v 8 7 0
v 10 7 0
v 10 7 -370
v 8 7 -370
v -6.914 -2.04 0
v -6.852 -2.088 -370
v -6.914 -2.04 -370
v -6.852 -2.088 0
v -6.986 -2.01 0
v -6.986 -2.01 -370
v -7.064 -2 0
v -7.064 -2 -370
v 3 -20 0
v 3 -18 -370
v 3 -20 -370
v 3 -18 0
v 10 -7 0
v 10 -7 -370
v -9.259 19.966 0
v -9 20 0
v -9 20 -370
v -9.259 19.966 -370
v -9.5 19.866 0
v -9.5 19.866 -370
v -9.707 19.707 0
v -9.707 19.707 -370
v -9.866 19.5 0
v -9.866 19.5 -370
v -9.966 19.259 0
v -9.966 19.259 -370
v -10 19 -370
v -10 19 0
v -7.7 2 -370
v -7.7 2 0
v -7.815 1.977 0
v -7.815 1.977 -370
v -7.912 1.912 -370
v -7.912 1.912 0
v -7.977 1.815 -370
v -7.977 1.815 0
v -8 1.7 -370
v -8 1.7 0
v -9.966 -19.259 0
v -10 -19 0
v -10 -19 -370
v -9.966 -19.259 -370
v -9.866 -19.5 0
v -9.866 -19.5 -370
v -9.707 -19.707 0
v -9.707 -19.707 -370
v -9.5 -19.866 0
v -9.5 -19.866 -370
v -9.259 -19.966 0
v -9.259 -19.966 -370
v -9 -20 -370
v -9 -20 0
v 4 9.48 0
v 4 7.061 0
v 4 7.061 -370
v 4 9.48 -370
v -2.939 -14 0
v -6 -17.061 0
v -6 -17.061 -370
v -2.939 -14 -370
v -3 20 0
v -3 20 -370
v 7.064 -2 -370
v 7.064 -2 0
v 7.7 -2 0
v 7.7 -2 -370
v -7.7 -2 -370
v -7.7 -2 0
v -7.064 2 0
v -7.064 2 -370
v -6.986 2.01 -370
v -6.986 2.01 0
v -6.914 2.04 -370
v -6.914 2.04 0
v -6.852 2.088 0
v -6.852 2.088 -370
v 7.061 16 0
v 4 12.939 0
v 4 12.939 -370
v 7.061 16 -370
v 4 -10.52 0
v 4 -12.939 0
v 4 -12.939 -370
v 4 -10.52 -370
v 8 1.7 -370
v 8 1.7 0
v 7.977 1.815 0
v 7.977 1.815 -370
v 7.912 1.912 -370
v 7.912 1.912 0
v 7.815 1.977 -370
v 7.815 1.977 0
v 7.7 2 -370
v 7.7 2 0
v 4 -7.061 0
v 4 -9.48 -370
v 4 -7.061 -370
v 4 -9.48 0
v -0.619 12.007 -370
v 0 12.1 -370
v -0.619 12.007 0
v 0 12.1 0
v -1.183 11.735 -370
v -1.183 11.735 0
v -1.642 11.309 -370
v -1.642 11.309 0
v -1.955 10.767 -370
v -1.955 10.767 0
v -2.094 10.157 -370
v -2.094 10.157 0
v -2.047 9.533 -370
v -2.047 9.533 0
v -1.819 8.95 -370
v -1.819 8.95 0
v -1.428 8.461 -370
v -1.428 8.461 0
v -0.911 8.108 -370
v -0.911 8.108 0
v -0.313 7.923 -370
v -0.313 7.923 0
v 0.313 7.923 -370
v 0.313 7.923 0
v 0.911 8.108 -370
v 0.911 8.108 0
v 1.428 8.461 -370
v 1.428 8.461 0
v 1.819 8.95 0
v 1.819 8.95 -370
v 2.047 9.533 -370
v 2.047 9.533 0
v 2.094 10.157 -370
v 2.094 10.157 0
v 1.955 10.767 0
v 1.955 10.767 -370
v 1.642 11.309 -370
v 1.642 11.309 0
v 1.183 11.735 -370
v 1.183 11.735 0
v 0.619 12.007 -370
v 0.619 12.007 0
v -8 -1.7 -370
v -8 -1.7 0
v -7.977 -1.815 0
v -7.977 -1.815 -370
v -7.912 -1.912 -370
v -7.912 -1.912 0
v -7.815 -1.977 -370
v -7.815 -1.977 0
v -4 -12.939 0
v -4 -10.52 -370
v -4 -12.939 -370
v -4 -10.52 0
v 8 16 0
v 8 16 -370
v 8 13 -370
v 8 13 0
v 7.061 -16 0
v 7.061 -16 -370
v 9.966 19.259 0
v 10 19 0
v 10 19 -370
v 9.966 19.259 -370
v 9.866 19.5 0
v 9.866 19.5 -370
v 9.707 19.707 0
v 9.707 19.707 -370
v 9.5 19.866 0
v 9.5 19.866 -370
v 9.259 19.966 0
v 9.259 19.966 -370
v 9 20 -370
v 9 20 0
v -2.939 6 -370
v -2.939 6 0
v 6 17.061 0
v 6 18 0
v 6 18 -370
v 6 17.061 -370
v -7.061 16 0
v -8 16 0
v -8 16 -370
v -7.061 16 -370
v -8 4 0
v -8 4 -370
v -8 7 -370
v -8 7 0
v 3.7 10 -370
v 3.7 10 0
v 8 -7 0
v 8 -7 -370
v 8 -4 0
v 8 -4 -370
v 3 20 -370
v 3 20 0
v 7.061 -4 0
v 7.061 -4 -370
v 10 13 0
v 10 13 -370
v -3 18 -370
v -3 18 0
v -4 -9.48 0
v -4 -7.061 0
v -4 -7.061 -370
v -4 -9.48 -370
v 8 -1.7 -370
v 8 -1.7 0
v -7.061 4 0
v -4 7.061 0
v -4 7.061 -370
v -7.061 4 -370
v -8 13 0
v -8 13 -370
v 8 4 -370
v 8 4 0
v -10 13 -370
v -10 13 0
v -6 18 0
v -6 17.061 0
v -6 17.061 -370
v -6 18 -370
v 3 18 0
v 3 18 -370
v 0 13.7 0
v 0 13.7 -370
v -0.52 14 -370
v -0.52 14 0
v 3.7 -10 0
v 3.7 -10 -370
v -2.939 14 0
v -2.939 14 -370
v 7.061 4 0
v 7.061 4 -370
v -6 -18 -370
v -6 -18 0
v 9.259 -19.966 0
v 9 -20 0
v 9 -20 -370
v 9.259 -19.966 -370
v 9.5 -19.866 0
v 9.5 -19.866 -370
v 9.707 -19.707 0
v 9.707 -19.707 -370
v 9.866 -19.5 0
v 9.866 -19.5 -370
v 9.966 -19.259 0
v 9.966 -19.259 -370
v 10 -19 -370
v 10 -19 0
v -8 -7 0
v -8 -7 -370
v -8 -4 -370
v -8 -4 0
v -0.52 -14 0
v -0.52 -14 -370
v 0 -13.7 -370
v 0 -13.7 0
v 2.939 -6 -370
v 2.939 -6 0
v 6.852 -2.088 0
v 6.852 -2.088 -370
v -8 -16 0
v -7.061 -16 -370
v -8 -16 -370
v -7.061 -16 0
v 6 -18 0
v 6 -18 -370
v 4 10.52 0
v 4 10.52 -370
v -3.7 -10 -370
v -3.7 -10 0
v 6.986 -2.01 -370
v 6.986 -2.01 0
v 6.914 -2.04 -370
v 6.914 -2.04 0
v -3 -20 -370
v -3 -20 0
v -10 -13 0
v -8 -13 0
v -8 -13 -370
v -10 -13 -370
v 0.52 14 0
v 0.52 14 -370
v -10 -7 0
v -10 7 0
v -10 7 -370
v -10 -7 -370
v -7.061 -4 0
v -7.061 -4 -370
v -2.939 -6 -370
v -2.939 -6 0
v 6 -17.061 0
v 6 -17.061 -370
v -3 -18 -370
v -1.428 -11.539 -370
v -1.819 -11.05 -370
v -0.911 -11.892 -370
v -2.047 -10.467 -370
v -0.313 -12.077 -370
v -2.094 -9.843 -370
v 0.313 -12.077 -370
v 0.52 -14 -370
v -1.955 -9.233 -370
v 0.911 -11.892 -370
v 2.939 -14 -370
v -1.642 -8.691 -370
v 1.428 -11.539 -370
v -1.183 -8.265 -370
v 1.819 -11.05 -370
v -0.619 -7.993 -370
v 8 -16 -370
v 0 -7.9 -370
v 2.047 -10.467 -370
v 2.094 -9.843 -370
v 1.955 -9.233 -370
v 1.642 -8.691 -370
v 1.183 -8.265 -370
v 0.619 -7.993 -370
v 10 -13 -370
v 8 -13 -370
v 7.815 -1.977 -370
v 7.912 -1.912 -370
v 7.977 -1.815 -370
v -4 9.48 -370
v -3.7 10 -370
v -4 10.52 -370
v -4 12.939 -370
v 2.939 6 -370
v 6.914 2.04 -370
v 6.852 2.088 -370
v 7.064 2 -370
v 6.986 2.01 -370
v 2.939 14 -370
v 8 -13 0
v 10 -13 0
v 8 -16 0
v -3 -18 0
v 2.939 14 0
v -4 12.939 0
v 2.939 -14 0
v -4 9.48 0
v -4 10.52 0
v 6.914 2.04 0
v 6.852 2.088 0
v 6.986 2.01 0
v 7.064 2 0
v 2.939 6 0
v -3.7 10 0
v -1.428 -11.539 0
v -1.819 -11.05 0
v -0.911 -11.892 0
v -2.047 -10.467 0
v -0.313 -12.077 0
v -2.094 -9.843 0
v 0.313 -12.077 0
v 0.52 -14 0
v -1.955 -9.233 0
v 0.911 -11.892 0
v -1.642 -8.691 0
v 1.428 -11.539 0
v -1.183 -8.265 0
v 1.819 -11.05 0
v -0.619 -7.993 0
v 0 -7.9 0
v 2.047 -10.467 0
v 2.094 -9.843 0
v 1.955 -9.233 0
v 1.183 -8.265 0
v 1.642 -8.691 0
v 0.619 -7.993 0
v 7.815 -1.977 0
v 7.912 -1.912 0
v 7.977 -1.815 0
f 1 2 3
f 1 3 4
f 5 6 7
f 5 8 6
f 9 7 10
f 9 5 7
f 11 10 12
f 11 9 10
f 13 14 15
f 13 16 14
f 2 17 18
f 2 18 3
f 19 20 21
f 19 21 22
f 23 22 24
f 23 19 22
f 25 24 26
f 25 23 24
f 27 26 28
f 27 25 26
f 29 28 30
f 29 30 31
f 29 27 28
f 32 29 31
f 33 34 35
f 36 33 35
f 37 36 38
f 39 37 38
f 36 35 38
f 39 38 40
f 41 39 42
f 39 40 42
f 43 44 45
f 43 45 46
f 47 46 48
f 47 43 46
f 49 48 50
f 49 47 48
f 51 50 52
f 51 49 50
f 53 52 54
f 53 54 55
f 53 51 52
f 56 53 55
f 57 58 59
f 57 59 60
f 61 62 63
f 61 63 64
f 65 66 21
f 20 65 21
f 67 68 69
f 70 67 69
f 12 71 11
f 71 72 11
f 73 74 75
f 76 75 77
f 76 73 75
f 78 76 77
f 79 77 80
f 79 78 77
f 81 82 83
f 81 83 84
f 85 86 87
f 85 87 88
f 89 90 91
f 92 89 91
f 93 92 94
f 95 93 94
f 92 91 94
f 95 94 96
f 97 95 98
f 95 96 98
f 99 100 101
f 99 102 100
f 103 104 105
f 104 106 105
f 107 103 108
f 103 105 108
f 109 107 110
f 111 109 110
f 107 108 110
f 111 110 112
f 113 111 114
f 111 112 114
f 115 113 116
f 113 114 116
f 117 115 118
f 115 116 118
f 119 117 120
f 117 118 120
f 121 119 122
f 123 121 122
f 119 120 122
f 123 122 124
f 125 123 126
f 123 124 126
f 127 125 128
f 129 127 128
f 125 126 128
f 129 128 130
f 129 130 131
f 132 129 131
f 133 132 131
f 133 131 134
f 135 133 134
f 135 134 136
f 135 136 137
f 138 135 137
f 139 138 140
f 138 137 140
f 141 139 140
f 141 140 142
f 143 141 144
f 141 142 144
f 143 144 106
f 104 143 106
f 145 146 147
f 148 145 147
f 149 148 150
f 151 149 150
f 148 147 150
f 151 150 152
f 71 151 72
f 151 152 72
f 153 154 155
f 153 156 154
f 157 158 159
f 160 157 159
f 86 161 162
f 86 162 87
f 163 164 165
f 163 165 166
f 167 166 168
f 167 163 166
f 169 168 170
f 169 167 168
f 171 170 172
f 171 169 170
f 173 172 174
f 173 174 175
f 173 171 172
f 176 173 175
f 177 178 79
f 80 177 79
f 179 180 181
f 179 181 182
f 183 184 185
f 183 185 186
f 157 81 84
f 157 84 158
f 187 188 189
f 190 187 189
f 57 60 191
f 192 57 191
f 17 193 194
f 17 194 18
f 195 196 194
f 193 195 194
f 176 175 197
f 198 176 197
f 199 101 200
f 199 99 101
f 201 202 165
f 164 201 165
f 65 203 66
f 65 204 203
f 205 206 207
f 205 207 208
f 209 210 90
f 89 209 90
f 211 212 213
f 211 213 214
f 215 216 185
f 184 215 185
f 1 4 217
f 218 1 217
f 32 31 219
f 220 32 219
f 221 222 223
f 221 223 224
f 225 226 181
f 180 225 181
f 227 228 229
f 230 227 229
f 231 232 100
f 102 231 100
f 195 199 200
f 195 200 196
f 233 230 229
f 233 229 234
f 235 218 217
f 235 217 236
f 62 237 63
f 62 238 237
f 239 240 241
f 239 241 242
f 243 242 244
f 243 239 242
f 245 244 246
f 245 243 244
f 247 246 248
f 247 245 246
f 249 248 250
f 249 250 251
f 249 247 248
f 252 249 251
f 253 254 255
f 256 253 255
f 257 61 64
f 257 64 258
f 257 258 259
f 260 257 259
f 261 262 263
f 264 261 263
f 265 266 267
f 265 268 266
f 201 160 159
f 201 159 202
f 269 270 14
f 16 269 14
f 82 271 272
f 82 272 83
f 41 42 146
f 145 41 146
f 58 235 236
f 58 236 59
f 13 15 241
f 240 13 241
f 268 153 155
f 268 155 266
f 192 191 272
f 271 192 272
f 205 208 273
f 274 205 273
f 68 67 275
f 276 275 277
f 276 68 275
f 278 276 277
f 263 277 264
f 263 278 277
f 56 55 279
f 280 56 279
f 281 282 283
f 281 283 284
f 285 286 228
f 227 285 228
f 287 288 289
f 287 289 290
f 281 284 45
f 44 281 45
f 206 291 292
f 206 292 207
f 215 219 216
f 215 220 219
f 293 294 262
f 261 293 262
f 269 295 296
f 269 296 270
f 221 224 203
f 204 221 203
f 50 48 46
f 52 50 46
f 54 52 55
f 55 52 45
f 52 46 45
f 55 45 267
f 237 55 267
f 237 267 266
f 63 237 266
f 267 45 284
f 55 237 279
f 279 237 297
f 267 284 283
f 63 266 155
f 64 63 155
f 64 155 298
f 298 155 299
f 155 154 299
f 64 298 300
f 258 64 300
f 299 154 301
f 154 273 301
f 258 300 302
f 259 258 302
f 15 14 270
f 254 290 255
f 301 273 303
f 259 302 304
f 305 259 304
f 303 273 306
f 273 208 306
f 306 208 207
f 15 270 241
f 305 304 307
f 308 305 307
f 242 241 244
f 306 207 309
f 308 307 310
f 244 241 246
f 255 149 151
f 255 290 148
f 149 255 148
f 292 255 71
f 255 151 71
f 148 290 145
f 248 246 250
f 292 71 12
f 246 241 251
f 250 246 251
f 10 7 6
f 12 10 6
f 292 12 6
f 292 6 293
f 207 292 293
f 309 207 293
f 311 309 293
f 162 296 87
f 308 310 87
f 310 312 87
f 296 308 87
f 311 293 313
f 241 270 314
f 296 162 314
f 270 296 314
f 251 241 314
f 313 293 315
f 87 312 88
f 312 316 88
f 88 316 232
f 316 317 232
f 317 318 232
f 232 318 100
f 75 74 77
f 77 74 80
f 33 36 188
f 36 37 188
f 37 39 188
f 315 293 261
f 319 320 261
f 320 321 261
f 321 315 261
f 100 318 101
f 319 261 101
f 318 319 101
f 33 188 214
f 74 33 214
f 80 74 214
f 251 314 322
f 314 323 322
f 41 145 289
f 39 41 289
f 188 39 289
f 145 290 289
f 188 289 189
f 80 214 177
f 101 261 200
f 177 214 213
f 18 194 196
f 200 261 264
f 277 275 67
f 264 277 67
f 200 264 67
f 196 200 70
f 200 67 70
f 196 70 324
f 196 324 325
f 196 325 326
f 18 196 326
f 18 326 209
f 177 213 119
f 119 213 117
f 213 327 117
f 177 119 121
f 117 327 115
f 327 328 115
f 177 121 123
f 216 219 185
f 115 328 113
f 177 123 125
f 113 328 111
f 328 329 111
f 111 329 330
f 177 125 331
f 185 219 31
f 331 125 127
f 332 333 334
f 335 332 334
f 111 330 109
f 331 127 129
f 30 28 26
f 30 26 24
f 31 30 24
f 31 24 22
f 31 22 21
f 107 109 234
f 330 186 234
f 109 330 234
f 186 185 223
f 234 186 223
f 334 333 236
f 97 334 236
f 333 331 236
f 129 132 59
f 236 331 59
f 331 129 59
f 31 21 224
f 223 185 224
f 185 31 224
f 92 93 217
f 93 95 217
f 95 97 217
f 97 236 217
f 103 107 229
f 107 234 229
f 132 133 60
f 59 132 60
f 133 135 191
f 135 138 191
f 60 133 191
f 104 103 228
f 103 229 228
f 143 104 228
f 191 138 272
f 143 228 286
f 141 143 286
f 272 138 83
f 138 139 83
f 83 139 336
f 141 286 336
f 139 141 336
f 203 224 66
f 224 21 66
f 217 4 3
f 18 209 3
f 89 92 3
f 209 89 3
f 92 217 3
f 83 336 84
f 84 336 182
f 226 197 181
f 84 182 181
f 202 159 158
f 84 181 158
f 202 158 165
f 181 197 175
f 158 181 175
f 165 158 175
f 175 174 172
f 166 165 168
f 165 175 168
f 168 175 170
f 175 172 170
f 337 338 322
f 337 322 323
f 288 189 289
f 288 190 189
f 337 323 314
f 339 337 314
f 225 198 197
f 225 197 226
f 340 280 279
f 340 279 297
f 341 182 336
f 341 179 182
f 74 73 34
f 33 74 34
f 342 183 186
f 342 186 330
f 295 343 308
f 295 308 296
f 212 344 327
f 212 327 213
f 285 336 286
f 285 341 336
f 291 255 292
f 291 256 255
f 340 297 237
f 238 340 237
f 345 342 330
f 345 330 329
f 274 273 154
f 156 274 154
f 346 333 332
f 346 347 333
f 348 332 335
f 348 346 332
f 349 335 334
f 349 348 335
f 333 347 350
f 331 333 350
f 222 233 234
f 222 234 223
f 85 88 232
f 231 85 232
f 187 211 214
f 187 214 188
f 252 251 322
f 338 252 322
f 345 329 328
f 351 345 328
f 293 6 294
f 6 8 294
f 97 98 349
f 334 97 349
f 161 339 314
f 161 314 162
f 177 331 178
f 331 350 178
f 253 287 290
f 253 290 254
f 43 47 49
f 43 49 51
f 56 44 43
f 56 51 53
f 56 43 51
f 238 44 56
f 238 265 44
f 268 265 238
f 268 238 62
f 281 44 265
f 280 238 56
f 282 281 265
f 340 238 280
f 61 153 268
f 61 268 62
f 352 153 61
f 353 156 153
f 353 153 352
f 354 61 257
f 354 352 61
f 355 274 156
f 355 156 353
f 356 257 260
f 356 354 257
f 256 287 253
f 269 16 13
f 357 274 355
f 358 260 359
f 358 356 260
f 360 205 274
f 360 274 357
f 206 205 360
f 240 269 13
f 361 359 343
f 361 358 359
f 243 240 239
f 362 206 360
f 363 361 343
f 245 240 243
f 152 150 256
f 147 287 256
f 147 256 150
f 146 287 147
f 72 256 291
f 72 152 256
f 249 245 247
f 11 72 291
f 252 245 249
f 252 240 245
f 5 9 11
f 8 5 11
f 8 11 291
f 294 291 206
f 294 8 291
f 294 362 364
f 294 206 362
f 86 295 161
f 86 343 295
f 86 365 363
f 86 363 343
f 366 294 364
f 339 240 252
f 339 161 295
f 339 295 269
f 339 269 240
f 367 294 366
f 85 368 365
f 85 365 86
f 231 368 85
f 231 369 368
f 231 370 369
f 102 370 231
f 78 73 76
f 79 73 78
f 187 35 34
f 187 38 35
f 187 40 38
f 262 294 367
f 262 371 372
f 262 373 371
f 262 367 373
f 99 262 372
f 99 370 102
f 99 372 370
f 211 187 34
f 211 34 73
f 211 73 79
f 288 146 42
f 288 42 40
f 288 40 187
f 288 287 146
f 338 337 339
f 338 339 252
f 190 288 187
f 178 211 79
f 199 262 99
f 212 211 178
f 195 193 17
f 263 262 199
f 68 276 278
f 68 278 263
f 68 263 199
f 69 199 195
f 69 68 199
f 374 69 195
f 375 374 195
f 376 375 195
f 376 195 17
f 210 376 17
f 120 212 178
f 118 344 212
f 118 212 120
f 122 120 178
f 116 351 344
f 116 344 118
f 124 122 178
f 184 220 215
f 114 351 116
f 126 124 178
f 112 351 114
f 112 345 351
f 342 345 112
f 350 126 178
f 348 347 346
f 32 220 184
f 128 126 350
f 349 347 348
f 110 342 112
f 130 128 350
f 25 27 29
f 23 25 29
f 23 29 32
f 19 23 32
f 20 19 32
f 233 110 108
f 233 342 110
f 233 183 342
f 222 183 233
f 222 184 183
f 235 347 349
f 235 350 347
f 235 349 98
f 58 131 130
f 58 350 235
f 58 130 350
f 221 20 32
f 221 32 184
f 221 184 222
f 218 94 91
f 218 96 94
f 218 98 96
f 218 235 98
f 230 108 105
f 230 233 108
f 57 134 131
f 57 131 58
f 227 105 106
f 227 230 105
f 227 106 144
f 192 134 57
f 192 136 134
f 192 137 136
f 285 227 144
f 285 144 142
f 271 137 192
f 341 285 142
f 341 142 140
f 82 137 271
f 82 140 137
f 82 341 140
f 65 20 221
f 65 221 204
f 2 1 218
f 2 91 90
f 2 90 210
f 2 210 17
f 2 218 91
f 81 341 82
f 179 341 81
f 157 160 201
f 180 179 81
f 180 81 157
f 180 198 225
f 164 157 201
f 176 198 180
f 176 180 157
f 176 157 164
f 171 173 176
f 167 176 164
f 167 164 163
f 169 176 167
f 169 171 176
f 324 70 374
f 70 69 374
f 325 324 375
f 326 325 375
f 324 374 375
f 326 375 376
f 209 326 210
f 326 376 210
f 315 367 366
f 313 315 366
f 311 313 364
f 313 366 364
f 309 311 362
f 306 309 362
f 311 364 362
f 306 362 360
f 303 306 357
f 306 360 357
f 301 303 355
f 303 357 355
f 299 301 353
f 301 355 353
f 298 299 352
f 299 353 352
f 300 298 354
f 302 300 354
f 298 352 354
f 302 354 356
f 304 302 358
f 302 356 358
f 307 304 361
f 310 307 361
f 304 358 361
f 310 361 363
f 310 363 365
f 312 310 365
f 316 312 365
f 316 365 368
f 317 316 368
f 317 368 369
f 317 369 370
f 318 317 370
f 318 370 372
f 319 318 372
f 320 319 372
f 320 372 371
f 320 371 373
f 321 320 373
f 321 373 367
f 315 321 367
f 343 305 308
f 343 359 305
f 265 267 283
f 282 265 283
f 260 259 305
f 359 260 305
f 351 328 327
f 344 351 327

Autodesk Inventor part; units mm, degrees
sketch "Sketch_1" plane through (0, 0, 0) normal (0, 0, 1) x (1, 0, 0)
  line L0 (-10, -7) -> (-8, -7)
  line L1 (-8, -7) -> (-8, -4)
  line L2 (-8, -4) -> (-7.0607, -4)
  line L3 (-7.0607, -4) -> (-4, -7.0607)
  line L4 (-4, -7.0607) -> (-4, -9.4804)
  line L5 (-4, -9.4804) -> (-3.7, -10)
  line L6 (-3.7, -10) -> (-4, -10.5196)
  line L7 (-4, -10.5196) -> (-4, -12.9393)
  line L8 (-4, -12.9393) -> (-7.0607, -16)
  line L9 (-7.0607, -16) -> (-8, -16)
  line L10 (-8, -16) -> (-8, -13)
  line L11 (-8, -13) -> (-10, -13)
  line L12 (-10, -13) -> (-10, -19)
  arc A0 (-10, -19) -> (-9, -20) centre (-9, -19) ccw
  line L13 (-9, -20) -> (-3, -20)
  line L14 (-3, -20) -> (-3, -18)
  line L15 (-3, -18) -> (-6, -18)
  line L16 (-6, -18) -> (-6, -17.0607)
  line L17 (-6, -17.0607) -> (-2.9393, -14)
  line L18 (-2.9393, -14) -> (-0.5196, -14)
  line L19 (-0.5196, -14) -> (0, -13.7)
  line L20 (0, -13.7) -> (0.5196, -14)
  line L21 (0.5196, -14) -> (2.9393, -14)
  line L22 (2.9393, -14) -> (6, -17.0607)
  line L23 (6, -17.0607) -> (6, -18)
  line L24 (6, -18) -> (3, -18)
  line L25 (3, -18) -> (3, -20)
  line L26 (3, -20) -> (9, -20)
  arc A1 (9, -20) -> (10, -19) centre (9, -19) ccw
  line L27 (10, -19) -> (10, -13)
  line L28 (10, -13) -> (8, -13)
  line L29 (8, -13) -> (8, -16)
  line L30 (8, -16) -> (7.0607, -16)
  line L31 (7.0607, -16) -> (4, -12.9393)
  line L32 (4, -12.9393) -> (4, -10.5196)
  line L33 (4, -10.5196) -> (3.7, -10)
  line L34 (3.7, -10) -> (4, -9.4804)
  line L35 (4, -9.4804) -> (4, -7.0607)
  line L36 (4, -7.0607) -> (7.0607, -4)
  line L37 (7.0607, -4) -> (8, -4)
  line L38 (8, -4) -> (8, -7)
  line L39 (8, -7) -> (10, -7)
  line L40 (10, -7) -> (10, 7)
  line L41 (10, 7) -> (8, 7)
  line L42 (8, 7) -> (8, 4)
  line L43 (8, 4) -> (7.0607, 4)
  line L44 (7.0607, 4) -> (4, 7.0607)
  line L45 (4, 7.0607) -> (4, 9.4804)
  line L46 (4, 9.4804) -> (3.7, 10)
  line L47 (3.7, 10) -> (4, 10.5196)
  line L48 (4, 10.5196) -> (4, 12.9393)
  line L49 (4, 12.9393) -> (7.0607, 16)
  line L50 (7.0607, 16) -> (8, 16)
  line L51 (8, 16) -> (8, 13)
  line L52 (8, 13) -> (10, 13)
  line L53 (10, 13) -> (10, 19)
  arc A2 (10, 19) -> (9, 20) centre (9, 19) ccw
  line L54 (9, 20) -> (3, 20)
  line L55 (3, 20) -> (3, 18)
  line L56 (3, 18) -> (6, 18)
  line L57 (6, 18) -> (6, 17.0607)
  line L58 (6, 17.0607) -> (2.9393, 14)
  line L59 (2.9393, 14) -> (0.5196, 14)
  line L60 (0.5196, 14) -> (0, 13.7)
  line L61 (0, 13.7) -> (-0.5196, 14)
  line L62 (-0.5196, 14) -> (-2.9393, 14)
  line L63 (-2.9393, 14) -> (-6, 17.0607)
  line L64 (-6, 17.0607) -> (-6, 18)
  line L65 (-6, 18) -> (-3, 18)
  line L66 (-3, 18) -> (-3, 20)
  line L67 (-3, 20) -> (-9, 20)
  arc A3 (-9, 20) -> (-10, 19) centre (-9, 19) ccw
  line L68 (-10, 19) -> (-10, 13)
  line L69 (-10, 13) -> (-8, 13)
  line L70 (-8, 13) -> (-8, 16)
  line L71 (-8, 16) -> (-7.0607, 16)
  line L72 (-7.0607, 16) -> (-4, 12.9393)
  line L73 (-4, 12.9393) -> (-4, 10.5196)
  line L74 (-4, 10.5196) -> (-3.7, 10)
  line L75 (-3.7, 10) -> (-4, 9.4804)
  line L76 (-4, 9.4804) -> (-4, 7.0607)
  line L77 (-4, 7.0607) -> (-7.0607, 4)
  line L78 (-7.0607, 4) -> (-8, 4)
  line L79 (-8, 4) -> (-8, 7)
  line L80 (-8, 7) -> (-10, 7)
  line L81 (-10, 7) -> (-10, -7)
  line L82 (-8, 1.7) -> (-8, -1.7)
  arc A4 (-8, -1.7) -> (-7.7, -2) centre (-7.7, -1.7) ccw
  line L83 (-7.7, -2) -> (-7.0636, -2)
  arc A5 (-6.8515, -2.0879) -> (-7.0636, -2) centre (-7.0636, -2.3) ccw
  line L84 (-6.8515, -2.0879) -> (-2.9393, -6)
  line L85 (-2.9393, -6) -> (2.9393, -6)
  line L86 (2.9393, -6) -> (6.8515, -2.0879)
  arc A6 (7.0636, -2) -> (6.8515, -2.0879) centre (7.0636, -2.3) ccw
  line L87 (7.0636, -2) -> (7.7, -2)
  arc A7 (7.7, -2) -> (8, -1.7) centre (7.7, -1.7) ccw
  line L88 (8, -1.7) -> (8, 1.7)
  arc A8 (8, 1.7) -> (7.7, 2) centre (7.7, 1.7) ccw
  line L89 (7.7, 2) -> (7.0636, 2)
  arc A9 (6.8515, 2.0879) -> (7.0636, 2) centre (7.0636, 2.3) ccw
  line L90 (6.8515, 2.0879) -> (2.9393, 6)
  line L91 (2.9393, 6) -> (-2.9393, 6)
  line L92 (-2.9393, 6) -> (-6.8515, 2.0879)
  arc A10 (-7.0636, 2) -> (-6.8515, 2.0879) centre (-7.0636, 2.3) ccw
  line L93 (-7.0636, 2) -> (-7.7, 2)
  arc A11 (-7.7, 2) -> (-8, 1.7) centre (-7.7, 1.7) ccw
extrude "Extrusion1" add sketch "Sketch_1" against normal blind 370
sketch "Sketch2" plane through (0, 0, -370) normal (0, 0, -1) x (-1, 0, 0)
  point P0 (0, 10)
hole "Hole1" at (0, 10, -370) direction (0, 0, 1) diameter 4.2 depth 370
pattern_linear "Rectangular Pattern1" count 2 spacing 20 along (0, -1, 0) of "Hole1"
ref_plane "C1_XY" through (0, 0, 0) normal (0, 0, 1) x (1, 0, 0)
ref_plane "C1_YZ" through (0, 0, 0) normal (1, 0, 0) x (0, 1, 0)
ref_plane "C1_ZX" through (0, 0, 0) normal (0, 1, 0) x (0, 0, 1)
properties part number "HFS5-2040-370"
